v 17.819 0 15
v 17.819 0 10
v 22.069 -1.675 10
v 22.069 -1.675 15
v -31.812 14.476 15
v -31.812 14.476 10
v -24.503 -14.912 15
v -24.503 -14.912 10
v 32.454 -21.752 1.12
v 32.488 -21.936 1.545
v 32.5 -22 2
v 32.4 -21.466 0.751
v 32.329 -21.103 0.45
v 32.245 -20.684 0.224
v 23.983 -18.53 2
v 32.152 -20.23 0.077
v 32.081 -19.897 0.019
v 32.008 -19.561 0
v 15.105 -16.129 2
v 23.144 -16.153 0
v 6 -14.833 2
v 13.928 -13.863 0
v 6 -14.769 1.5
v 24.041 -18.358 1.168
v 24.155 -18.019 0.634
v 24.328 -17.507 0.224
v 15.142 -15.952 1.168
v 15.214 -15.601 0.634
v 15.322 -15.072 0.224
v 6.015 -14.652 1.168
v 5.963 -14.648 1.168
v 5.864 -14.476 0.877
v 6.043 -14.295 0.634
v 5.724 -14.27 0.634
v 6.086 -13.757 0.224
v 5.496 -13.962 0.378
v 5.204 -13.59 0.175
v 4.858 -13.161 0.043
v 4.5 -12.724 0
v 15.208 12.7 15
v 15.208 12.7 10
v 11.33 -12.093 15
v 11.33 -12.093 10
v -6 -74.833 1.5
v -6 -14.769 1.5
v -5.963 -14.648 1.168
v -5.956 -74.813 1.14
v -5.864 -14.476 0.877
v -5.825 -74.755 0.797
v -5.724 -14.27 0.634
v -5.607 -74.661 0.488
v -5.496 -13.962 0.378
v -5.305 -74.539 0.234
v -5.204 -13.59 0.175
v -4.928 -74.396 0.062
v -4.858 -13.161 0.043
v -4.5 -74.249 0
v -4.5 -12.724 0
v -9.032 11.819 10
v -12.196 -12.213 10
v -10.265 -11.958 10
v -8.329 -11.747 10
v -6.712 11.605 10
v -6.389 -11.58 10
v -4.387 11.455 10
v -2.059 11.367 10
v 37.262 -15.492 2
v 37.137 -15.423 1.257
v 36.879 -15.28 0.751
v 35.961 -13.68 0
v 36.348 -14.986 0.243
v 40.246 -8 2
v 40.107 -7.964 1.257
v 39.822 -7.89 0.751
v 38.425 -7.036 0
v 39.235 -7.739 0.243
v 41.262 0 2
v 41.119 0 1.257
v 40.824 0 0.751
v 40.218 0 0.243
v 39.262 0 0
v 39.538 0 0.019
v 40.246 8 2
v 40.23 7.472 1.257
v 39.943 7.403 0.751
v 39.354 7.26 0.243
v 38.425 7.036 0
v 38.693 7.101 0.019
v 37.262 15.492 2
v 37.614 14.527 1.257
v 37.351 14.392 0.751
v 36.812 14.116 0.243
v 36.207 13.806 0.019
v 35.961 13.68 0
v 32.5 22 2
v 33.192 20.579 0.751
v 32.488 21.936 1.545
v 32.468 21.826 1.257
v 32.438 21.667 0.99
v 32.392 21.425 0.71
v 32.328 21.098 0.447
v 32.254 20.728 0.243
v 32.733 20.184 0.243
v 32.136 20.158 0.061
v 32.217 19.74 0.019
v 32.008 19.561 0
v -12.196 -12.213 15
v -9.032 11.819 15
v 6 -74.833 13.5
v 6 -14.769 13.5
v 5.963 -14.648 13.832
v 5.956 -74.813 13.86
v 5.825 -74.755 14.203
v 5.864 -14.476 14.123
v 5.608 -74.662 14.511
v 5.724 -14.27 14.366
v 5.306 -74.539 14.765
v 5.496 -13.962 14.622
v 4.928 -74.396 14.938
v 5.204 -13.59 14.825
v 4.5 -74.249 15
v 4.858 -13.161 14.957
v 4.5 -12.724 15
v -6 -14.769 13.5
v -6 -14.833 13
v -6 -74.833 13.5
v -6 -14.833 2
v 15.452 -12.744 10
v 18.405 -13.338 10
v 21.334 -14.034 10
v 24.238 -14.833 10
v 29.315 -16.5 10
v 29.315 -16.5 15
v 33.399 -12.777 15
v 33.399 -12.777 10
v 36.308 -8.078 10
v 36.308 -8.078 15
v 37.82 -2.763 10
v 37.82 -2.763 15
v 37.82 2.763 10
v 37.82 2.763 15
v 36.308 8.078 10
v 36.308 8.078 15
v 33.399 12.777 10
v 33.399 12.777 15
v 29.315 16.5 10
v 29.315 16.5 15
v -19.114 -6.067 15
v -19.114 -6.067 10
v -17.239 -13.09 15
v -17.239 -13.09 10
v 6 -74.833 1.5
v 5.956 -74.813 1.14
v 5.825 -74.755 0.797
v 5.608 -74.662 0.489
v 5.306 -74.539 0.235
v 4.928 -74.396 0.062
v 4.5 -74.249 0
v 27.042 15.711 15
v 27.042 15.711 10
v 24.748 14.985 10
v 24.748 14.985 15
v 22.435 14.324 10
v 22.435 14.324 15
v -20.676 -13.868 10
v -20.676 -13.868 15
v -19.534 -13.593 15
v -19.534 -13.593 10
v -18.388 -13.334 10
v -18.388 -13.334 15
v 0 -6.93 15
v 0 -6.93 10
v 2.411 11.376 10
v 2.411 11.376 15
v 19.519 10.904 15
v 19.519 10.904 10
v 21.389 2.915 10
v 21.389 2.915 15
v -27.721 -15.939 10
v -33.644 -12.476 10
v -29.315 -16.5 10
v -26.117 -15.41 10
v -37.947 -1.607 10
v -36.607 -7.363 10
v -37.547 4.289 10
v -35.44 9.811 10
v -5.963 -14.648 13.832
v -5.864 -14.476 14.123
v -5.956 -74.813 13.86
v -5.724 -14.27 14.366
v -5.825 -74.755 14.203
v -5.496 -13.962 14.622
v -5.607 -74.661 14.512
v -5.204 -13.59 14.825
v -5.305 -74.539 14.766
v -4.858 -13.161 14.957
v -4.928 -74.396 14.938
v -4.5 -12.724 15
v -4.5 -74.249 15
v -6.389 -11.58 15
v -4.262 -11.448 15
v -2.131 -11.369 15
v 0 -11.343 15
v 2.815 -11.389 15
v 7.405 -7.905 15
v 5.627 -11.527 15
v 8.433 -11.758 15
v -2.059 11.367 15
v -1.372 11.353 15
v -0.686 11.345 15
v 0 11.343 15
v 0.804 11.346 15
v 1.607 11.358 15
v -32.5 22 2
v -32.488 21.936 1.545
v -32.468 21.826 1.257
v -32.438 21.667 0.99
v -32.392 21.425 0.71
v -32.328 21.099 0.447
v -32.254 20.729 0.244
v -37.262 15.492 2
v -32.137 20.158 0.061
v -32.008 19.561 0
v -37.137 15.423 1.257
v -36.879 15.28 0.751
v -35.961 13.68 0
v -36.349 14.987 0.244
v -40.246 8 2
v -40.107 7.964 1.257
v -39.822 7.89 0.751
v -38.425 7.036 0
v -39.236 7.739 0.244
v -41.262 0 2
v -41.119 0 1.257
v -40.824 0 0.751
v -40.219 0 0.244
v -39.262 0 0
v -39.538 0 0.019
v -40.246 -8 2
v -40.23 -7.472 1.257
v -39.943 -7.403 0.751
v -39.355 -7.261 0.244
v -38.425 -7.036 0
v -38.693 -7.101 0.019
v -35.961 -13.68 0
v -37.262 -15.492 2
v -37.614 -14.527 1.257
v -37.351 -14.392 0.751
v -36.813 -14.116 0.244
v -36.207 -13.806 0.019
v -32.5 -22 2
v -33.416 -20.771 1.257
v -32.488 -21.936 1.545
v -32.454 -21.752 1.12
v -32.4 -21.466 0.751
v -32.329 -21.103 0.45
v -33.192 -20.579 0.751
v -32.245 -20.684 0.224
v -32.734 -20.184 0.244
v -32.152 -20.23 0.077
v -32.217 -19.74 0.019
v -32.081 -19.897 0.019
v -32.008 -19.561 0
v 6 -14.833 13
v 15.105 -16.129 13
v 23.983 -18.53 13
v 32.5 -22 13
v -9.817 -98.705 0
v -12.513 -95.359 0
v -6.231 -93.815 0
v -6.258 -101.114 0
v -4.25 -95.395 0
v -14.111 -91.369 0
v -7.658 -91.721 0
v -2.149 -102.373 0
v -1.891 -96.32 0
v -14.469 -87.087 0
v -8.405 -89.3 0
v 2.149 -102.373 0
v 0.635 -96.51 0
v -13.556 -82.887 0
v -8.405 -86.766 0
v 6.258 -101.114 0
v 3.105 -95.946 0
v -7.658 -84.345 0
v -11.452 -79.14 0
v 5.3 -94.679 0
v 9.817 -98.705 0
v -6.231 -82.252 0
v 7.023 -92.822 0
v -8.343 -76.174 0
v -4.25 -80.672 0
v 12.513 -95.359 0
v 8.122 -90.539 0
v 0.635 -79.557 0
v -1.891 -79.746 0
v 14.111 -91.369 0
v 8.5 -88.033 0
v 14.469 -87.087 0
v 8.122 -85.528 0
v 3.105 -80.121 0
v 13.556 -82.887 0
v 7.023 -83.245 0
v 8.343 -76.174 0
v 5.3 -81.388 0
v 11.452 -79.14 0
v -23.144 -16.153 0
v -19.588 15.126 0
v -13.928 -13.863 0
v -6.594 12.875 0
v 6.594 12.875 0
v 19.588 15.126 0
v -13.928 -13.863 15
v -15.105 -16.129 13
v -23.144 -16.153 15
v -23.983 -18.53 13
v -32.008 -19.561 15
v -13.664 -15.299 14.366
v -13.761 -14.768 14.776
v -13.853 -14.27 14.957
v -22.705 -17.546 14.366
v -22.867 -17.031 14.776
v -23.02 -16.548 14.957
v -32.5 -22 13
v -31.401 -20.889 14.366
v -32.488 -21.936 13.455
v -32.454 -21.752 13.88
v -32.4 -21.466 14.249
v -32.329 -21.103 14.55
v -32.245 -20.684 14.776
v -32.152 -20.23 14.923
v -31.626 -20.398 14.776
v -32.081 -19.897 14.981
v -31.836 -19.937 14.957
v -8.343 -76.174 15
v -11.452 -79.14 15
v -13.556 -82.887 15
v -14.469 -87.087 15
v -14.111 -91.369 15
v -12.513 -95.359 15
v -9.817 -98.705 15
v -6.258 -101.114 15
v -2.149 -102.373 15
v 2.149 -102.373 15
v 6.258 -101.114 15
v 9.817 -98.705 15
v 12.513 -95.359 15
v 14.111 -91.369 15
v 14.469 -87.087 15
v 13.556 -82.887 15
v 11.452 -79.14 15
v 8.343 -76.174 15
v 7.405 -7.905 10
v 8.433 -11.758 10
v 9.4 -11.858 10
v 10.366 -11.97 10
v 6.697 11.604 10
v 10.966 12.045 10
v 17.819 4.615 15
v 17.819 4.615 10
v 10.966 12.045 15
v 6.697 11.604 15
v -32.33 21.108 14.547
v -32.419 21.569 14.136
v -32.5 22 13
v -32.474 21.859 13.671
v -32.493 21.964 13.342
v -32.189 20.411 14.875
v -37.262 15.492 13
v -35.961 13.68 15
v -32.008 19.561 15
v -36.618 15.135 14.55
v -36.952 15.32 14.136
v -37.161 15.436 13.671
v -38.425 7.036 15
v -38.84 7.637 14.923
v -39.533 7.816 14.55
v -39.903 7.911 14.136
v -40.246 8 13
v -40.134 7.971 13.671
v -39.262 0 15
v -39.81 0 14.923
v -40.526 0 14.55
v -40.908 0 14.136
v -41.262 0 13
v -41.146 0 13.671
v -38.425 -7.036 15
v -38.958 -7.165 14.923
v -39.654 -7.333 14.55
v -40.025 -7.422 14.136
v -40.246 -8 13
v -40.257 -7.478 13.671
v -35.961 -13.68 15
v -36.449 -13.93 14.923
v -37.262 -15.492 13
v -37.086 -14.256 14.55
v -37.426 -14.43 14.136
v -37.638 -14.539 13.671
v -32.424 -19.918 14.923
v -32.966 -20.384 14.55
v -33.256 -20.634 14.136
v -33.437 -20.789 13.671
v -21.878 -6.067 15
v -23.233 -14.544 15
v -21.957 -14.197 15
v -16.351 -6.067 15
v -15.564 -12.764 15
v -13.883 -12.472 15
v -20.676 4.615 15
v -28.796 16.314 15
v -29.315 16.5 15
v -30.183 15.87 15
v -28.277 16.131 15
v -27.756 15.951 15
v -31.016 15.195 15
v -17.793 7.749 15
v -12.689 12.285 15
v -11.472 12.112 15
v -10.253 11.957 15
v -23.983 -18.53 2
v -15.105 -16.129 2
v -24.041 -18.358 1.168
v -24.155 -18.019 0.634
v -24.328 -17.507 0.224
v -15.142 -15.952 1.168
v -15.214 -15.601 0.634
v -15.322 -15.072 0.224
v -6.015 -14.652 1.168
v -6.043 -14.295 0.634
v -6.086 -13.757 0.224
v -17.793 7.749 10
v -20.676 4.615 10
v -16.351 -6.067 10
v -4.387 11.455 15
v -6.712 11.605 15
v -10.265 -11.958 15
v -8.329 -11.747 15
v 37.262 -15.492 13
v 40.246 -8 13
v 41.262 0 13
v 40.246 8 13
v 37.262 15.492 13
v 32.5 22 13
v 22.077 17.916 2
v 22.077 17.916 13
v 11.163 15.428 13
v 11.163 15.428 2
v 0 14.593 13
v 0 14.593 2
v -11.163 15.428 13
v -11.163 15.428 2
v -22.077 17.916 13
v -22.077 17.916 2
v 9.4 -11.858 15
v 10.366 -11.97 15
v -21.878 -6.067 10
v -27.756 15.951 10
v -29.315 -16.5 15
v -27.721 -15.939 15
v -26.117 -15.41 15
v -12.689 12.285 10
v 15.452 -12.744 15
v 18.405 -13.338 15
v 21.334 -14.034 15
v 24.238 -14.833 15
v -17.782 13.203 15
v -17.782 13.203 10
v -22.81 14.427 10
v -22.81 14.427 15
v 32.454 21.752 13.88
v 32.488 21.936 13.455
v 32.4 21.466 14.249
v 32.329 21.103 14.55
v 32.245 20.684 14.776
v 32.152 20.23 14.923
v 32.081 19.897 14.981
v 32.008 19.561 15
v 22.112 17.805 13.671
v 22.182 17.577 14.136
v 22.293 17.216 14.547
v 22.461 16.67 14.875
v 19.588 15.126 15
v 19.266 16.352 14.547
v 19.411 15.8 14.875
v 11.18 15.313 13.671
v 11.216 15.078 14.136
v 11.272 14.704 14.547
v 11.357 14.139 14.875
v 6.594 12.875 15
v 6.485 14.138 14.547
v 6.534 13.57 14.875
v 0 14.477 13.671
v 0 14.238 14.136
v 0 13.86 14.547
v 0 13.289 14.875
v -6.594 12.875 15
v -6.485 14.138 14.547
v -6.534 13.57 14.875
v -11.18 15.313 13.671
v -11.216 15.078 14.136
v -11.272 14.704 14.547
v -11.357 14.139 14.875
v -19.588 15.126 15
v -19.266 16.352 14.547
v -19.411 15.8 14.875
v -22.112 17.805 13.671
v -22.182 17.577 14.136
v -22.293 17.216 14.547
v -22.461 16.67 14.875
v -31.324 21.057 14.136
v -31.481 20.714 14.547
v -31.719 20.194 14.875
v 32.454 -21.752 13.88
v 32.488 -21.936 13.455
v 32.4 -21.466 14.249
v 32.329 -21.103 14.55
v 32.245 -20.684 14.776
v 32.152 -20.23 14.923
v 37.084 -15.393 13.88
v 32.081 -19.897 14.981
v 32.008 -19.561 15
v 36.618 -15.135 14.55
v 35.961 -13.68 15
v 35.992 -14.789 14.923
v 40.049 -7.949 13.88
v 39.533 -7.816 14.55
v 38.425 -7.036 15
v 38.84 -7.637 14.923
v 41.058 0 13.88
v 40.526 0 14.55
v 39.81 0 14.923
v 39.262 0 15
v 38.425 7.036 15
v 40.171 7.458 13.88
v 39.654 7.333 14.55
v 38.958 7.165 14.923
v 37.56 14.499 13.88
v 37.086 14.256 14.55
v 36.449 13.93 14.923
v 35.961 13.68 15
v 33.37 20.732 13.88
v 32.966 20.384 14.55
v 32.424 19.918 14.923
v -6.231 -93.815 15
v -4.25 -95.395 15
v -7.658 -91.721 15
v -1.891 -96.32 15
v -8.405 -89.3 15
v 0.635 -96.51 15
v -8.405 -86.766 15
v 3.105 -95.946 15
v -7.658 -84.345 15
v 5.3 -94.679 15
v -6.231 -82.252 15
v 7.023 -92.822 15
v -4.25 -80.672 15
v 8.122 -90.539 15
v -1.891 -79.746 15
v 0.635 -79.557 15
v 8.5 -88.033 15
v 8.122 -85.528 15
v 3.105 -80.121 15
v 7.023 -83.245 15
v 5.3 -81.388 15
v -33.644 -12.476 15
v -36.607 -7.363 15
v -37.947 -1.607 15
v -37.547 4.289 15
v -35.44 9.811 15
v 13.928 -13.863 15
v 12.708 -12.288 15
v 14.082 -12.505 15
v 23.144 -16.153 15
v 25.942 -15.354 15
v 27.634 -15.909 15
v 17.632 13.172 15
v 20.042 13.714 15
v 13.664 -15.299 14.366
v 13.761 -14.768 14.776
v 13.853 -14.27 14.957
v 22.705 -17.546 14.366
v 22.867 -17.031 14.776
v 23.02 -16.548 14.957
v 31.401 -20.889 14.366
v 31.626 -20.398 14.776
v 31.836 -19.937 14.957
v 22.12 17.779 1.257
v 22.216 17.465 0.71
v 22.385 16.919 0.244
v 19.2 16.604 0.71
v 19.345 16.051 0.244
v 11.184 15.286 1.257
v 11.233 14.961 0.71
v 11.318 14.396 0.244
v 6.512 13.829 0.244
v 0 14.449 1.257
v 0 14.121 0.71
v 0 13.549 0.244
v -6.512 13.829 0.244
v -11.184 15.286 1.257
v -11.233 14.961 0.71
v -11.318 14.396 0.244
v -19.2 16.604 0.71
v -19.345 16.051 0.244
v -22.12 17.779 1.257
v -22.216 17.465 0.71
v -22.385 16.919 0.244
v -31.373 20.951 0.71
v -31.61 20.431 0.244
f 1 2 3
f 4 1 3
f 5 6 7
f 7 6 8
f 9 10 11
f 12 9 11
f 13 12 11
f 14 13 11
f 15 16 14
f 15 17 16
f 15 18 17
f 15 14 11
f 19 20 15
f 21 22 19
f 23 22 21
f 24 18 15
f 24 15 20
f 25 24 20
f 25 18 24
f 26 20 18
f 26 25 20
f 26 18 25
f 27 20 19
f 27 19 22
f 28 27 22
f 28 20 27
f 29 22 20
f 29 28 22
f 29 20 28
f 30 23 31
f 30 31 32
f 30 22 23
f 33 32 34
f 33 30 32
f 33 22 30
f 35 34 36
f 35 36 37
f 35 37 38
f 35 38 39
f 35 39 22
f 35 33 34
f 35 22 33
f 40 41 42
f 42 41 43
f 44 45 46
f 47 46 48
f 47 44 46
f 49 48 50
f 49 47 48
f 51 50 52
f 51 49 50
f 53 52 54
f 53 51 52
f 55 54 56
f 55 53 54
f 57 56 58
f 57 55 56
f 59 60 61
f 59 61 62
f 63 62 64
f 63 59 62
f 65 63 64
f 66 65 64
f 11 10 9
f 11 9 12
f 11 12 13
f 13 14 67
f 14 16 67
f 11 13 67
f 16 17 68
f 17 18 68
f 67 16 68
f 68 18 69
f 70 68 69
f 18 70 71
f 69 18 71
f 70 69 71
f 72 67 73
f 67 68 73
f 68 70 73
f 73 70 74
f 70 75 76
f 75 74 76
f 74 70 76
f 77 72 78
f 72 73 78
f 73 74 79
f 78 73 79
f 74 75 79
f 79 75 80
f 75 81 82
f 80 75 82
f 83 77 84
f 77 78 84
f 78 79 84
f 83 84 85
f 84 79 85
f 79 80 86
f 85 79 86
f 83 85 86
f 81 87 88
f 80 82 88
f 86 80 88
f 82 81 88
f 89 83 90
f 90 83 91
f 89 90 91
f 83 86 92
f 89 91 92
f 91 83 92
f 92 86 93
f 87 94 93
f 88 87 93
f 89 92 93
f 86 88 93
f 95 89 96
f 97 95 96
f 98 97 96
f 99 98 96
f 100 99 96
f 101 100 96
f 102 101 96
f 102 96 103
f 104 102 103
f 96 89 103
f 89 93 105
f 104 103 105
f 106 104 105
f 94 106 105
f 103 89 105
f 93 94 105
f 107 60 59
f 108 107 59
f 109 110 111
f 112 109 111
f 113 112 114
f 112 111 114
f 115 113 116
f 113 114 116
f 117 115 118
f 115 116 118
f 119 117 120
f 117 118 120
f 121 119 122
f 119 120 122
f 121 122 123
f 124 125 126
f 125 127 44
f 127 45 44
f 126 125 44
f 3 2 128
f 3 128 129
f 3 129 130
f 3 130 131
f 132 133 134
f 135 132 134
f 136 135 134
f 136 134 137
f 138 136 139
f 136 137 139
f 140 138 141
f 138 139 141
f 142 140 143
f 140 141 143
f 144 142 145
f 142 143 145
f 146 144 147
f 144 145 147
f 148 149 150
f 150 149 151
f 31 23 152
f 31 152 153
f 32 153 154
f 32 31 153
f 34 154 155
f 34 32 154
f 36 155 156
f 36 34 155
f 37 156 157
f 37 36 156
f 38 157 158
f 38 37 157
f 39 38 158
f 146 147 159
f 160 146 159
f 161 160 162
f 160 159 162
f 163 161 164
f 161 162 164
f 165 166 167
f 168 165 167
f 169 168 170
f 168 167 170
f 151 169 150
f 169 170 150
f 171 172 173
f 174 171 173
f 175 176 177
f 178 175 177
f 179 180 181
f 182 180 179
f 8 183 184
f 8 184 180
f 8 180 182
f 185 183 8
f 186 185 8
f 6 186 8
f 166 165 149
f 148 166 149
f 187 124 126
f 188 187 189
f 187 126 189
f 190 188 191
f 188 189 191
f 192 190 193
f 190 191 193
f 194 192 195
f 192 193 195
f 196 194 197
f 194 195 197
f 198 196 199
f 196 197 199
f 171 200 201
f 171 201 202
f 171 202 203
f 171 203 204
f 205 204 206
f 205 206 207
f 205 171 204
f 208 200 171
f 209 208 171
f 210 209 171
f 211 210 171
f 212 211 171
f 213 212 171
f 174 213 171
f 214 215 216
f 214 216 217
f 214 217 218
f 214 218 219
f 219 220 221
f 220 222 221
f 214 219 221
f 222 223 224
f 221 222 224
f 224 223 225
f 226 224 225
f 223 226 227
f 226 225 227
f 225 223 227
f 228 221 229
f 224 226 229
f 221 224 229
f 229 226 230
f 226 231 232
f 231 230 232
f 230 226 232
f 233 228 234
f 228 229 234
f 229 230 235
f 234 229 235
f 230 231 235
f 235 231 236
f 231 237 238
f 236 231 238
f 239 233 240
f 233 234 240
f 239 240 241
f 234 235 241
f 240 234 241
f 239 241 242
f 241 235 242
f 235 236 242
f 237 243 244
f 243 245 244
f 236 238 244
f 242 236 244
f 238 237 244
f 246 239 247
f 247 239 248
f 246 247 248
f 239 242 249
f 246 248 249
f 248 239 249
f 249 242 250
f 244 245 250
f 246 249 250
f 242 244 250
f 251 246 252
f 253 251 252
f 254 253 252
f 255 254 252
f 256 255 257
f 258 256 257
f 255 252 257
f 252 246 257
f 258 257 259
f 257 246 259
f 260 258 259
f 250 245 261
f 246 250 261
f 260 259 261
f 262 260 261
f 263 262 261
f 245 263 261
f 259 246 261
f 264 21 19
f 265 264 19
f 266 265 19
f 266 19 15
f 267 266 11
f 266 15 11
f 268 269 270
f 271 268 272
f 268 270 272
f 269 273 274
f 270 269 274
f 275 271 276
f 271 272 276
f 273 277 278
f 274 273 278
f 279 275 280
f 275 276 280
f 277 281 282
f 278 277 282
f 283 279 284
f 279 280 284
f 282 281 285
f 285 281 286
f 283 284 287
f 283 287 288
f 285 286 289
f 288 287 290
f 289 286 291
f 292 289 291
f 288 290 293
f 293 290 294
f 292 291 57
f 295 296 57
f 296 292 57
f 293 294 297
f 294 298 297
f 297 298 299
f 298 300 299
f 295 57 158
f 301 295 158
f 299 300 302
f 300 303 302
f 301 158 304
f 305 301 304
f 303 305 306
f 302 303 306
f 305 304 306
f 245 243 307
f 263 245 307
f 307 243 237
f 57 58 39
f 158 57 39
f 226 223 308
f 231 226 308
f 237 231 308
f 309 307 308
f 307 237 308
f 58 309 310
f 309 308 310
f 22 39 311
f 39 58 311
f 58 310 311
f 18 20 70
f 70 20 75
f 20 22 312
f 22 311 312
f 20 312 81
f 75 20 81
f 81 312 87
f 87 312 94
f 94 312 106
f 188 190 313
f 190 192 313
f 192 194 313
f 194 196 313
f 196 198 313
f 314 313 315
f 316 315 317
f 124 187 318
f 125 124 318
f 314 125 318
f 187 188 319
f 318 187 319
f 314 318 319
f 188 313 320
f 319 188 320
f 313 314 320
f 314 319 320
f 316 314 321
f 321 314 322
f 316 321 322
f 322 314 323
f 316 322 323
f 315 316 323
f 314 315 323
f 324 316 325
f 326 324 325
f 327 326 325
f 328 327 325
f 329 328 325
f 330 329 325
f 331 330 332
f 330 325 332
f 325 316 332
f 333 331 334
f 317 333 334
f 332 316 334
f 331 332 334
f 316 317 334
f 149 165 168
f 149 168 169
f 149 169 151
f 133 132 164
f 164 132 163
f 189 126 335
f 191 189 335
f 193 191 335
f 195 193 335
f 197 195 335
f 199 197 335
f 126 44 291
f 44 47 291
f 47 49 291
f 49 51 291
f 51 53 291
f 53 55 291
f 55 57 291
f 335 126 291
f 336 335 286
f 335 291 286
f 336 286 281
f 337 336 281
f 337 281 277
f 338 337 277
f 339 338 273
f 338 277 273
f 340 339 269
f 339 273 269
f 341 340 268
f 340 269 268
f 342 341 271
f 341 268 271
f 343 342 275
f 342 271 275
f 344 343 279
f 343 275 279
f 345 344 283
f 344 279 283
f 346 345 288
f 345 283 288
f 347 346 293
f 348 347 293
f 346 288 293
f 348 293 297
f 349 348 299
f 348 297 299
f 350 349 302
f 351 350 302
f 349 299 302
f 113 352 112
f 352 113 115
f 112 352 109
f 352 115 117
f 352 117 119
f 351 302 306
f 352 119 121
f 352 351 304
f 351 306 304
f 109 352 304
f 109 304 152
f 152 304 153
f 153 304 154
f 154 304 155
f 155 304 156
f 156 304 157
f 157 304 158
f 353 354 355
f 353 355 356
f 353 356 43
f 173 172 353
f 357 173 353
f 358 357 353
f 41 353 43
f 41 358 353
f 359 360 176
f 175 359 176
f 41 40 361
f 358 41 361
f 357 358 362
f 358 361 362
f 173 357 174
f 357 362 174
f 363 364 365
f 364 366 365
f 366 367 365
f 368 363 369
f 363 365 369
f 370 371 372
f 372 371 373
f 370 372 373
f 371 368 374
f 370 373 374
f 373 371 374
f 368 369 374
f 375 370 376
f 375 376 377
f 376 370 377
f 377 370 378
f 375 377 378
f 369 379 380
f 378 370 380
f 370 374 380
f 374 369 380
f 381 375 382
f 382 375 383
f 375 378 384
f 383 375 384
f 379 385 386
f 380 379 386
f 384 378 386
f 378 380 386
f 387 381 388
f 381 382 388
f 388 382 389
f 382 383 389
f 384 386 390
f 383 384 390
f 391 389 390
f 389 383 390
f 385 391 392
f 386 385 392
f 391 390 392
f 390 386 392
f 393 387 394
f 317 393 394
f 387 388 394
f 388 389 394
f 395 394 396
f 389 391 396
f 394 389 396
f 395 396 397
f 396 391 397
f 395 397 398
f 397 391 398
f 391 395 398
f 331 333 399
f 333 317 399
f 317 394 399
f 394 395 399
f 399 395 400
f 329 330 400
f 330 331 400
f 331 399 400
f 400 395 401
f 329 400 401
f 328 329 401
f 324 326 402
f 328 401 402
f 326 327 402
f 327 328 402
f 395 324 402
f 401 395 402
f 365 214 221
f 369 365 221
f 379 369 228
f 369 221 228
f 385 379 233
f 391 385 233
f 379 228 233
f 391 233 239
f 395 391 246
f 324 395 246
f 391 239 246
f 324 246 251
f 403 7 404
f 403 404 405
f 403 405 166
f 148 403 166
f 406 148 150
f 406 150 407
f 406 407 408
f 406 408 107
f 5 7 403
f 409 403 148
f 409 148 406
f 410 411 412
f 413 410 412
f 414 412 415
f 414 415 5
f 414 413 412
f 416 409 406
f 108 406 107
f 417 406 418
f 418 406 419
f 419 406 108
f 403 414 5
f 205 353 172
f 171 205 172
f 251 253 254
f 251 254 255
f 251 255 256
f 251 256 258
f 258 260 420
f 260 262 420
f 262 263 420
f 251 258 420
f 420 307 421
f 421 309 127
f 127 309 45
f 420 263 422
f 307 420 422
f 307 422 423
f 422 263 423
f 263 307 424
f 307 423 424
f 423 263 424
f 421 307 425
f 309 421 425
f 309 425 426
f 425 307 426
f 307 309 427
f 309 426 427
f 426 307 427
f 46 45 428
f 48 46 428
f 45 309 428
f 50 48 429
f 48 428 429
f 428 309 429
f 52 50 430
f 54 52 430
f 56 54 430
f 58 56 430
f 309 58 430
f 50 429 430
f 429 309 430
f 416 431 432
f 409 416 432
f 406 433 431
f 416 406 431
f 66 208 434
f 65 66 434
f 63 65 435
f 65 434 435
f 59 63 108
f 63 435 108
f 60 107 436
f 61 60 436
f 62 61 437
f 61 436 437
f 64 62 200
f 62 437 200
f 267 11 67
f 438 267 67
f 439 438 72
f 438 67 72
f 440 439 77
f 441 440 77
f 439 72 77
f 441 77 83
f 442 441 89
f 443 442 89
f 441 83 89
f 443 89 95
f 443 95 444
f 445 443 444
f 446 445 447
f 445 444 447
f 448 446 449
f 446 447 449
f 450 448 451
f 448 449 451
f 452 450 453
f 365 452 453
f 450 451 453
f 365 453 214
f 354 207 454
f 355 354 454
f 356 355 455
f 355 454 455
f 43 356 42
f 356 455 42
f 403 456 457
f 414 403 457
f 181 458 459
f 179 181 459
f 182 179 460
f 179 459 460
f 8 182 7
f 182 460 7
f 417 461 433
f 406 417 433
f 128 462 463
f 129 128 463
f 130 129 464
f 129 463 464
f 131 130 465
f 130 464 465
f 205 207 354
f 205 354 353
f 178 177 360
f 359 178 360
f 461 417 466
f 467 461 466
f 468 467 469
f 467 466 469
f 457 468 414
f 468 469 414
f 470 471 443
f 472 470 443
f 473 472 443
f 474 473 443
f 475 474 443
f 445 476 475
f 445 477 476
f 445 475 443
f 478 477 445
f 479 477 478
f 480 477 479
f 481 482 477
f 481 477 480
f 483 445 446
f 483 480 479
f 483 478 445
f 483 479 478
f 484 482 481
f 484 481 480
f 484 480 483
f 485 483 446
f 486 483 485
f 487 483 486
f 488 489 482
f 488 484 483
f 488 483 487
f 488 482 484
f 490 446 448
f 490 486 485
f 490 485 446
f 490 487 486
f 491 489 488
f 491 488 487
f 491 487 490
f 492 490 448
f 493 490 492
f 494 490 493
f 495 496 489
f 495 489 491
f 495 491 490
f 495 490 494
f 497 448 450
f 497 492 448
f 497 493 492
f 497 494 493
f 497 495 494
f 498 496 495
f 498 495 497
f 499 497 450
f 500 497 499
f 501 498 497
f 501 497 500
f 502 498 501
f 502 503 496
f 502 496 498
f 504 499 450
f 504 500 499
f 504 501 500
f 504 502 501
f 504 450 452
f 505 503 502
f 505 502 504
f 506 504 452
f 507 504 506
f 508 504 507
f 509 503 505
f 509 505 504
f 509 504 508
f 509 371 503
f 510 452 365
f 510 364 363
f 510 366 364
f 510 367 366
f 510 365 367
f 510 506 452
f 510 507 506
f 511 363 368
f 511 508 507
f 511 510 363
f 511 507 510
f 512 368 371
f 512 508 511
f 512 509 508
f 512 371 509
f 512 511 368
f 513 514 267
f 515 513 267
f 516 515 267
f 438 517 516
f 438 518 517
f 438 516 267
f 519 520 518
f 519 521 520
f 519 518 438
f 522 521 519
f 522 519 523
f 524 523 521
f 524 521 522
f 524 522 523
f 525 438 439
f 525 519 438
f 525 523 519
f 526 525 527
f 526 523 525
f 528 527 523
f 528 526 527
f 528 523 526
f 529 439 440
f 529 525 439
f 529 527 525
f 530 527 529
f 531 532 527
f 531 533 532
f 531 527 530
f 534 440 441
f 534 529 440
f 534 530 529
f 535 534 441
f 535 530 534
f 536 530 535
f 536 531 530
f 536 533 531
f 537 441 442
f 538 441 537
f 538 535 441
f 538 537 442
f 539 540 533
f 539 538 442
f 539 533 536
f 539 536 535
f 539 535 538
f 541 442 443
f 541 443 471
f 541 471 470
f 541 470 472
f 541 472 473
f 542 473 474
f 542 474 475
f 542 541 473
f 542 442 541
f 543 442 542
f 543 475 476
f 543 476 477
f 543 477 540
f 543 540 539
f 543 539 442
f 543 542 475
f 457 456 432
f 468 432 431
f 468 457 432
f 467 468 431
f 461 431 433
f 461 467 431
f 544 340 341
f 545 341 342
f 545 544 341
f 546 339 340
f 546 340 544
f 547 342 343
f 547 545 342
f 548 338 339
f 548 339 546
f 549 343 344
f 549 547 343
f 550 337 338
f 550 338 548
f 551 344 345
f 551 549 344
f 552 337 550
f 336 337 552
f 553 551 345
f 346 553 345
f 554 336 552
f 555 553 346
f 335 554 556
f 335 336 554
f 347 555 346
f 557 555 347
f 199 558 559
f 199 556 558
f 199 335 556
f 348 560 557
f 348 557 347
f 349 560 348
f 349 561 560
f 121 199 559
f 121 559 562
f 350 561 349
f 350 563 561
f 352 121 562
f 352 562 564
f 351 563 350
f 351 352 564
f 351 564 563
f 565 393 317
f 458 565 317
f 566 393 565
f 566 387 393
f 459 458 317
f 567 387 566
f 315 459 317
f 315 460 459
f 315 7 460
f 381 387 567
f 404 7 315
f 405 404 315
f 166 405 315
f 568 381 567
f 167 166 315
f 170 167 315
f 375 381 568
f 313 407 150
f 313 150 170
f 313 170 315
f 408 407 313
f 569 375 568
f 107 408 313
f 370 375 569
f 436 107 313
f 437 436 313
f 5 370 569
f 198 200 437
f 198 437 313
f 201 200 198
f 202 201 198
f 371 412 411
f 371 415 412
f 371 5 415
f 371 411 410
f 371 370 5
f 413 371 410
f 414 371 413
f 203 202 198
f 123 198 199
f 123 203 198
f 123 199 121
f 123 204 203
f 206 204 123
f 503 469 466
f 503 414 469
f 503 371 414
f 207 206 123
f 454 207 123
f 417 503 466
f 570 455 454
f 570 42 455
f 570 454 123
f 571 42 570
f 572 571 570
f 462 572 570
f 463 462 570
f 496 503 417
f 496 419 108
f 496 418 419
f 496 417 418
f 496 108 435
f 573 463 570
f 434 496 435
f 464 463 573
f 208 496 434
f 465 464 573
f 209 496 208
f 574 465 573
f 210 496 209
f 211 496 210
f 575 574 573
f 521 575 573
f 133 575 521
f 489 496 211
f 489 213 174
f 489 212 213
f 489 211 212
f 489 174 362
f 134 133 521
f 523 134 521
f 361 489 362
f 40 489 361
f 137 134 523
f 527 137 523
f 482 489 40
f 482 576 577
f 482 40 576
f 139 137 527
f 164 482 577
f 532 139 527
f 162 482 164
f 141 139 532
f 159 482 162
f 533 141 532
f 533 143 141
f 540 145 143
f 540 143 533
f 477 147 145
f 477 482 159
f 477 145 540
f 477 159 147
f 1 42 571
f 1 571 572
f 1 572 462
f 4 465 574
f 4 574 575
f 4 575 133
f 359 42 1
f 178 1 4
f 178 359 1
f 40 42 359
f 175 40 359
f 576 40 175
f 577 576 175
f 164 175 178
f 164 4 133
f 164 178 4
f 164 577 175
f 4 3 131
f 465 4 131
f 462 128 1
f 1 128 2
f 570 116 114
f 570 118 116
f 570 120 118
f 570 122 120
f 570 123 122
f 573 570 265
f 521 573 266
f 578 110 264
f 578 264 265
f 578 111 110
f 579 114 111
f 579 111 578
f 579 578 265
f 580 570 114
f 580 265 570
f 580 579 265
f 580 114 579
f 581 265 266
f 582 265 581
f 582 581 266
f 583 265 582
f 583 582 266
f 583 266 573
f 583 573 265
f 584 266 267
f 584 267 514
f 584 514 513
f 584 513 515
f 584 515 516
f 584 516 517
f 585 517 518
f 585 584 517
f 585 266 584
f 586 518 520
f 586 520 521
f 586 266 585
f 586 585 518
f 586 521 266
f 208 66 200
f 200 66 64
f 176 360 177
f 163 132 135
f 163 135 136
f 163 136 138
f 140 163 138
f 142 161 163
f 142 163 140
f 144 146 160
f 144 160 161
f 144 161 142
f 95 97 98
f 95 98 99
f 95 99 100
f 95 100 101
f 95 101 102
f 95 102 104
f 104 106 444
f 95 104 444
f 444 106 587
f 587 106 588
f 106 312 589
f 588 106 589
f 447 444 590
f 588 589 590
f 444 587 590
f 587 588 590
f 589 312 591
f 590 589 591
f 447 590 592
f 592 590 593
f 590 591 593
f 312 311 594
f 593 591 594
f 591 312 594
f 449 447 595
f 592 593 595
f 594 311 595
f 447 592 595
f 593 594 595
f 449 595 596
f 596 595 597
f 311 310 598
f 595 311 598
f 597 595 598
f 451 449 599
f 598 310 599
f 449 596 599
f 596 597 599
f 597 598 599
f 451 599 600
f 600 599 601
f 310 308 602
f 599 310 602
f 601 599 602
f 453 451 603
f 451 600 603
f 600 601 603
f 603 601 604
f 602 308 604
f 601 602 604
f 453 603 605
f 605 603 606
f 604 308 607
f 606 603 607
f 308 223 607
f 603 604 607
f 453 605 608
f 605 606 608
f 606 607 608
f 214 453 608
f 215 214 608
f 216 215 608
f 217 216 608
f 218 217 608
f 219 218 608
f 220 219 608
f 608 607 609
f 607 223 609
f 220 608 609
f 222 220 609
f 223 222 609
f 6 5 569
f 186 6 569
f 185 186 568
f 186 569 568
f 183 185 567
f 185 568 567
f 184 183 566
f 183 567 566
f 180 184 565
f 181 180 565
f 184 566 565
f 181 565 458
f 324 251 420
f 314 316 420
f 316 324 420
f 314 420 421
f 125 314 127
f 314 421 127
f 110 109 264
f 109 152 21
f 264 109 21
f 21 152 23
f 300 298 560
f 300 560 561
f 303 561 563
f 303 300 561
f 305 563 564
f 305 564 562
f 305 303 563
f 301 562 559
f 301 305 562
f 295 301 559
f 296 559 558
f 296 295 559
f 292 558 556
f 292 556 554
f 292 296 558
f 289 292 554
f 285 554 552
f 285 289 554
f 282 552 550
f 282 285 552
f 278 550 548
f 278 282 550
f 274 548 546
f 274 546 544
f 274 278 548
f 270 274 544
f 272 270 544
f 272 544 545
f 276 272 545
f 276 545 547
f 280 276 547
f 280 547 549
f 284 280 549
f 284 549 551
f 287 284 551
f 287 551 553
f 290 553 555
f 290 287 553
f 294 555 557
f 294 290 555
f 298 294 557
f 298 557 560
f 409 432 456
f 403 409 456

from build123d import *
from build123d import SkipClean  # not in build123d's __all__

# Parameters (mm, degrees)
F0_R     = 8.5
F1_DEPTH = 15
F2_R     = 1.5
F4_R     = 2
F5_DEPTH = 5
F7_DEPTH = 5


with BuildPart() as f1:
    # F0 (on Top) → F1 (new body)
    with BuildSketch(Plane.XY):
        with BuildLine():
            Line((-32.5, -22), (-32.5, 22))
            ThreePointArc((-32.5, 22), (-41.2620999228, 0), (-32.5, -22))
        make_face()
        with BuildLine():
            ThreePointArc((32.5, 22), (0, 14.592529173), (-32.5, 22))
            Line((-32.5, 22), (0, 0))
            Line((0, 0), (32.5, 22))
        make_face()
        Polygon((0, 0), (-32.5, 22), (-32.5, -22), align=None)
        with BuildLine():
            Line((0, 0), (-32.5, -22))
            ThreePointArc((-32.5, -22), (-19.5807119119, -17.1936637052), (-6, -14.8329144067))
            ThreePointArc((-6, -14.8329144067), (0, -14.592529173), (6, -14.8329144067))
            ThreePointArc((6, -14.8329144067), (19.5807119119, -17.1936637052), (32.5, -22))
            Line((32.5, -22), (0, 0))
        make_face()
        Polygon((32.5, -22), (32.5, 22), (0, 0), align=None)
        with BuildLine():
            ThreePointArc((32.5, -22), (41.2620999228, 0), (32.5, 22))
            Line((32.5, 22), (32.5, -22))
        make_face()
        with BuildLine():
            ThreePointArc((6, -14.8329144067), (0, -14.592529173), (-6, -14.8329144067))
            Line((-6, -14.8329144067), (-6, -74.8329144067))
            Line((-6, -74.8329144067), (6, -74.8329144067))
            Line((6, -74.8329144067), (6, -14.8329144067))
        make_face()
        with BuildLine():
            Line((6, -74.8329144067), (-6, -74.8329144067))
            ThreePointArc((-6, -74.8329144067), (0, -102.5332931892), (6, -74.8329144067))
        make_face()
        with Locations((0, -88.0332931892)):
            Circle(F0_R, mode=Mode.SUBTRACT)
    extrude(amount=F1_DEPTH)

    # F2
    f2_edges = [f1.edges().sort_by_distance(p)[0] for p in [
        (-6, -44.832914, 15),
        (6, -44.832914, 15),
        (6, -44.832914, 0),
        (-6, -44.832914, 0),
    ]]
    fillet(f2_edges, radius=F2_R)

    # F4
    f4_edges = [f1.edges().sort_by_distance(p)[0] for p in [
        (-19.580712, -17.193664, 15),
        (-41.2621, 0, 15),
        (19.580712, -17.193664, 15),
        (-19.580712, -17.193664, 0),
        (-41.2621, 0, 0),
        (0, 14.592529, 0),
        (41.2621, 0, 0),
        (19.580712, -17.193664, 0),
        (41.2621, 0, 15),
        (0, 14.592529, 15),
    ]]
    fillet(f4_edges, radius=F4_R)

    # F3 (on face) → F5 (cut)
    with BuildSketch(Plane.XY.offset(15)):
        with BuildLine():
            Line((-29.3147544782, -16.5), (-29.3147544782, 16.5))
            ThreePointArc((-29.3147544782, 16.5), (-38.0120999228, 0), (-29.3147544782, -16.5))
        make_face()
        with BuildLine():
            ThreePointArc((0, 11.342529173), (-14.8824925286, 12.6417227993), (-29.3147544782, 16.5))
            Line((-29.3147544782, 16.5), (0, 0))
            Line((0, 0), (0, 11.342529173))
        make_face()
        Polygon((0, 0), (-29.3147544782, 16.5), (-29.3147544782, -16.5), align=None)
        with BuildLine():
            Line((0, 0), (-29.3147544782, -16.5))
            ThreePointArc((-29.3147544782, -16.5), (-14.8824925285, -12.6417227993), (0, -11.342529173))
            Line((0, -11.342529173), (0, 0))
        make_face()
        with BuildLine():
            ThreePointArc((29.3147544782, 16.5), (14.8824925286, 12.6417227993), (0, 11.342529173))
            Line((0, 11.342529173), (0, 0))
            Line((0, 0), (29.3147544782, 16.5))
        make_face()
        Polygon((29.3147544782, 16.5), (0, 0), (29.3147544782, -16.5), align=None)
        with BuildLine():
            Line((29.3147544782, -16.5), (0, 0))
            Line((0, 0), (0, -11.342529173))
            ThreePointArc((0, -11.342529173), (14.8824925286, -12.6417227993), (29.3147544782, -16.5))
        make_face()
        with BuildLine():
            ThreePointArc((29.3147544782, -16.5), (38.0120999228, 0), (29.3147544782, 16.5))
            Line((29.3147544782, 16.5), (29.3147544782, -16.5))
        make_face()
    with SkipClean():  # cleaning this boolean's faces spoils the solid; the shape is the same uncleaned
        extrude(amount=-F5_DEPTH, mode=Mode.SUBTRACT)

    # F6 (on face) → F7 (join)
    with BuildSketch(Plane.XY.offset(10)):
        with BuildLine():
            Line((15.2079802839, 12.699633284), (11.3304843403, -12.0931563405))
            ThreePointArc((11.3304843403, -12.0931563405), (13.3952654965, -12.3935064492), (15.4521416161, -12.7439233999))
            Line((15.4521416161, -12.7439233999), (17.8190562874, 0))
            Line((17.8190562874, 0), (22.0686495304, -1.6748139169))
            Line((22.0686495304, -1.6748139169), (24.2379181726, -14.8333900519))
            ThreePointArc((24.2379181726, -14.8333900519), (26.7892998078, -15.6272055953), (29.3147544782, -16.5))
            Line((29.3147544782, -16.5), (22.4350078947, 14.3243580948))
            ThreePointArc((22.4350078947, 14.3243580948), (18.8390172894, 13.4340497811), (15.2079802839, 12.699633284))
        make_face()
        Polygon((17.8190562874, 4.6145855449), (19.5188932121, 10.9039852396), (21.3887151331, 2.9147479217), align=None, mode=Mode.SUBTRACT)
        with BuildLine():
            Line((-2.0585943572, 11.3672025947), (-6.3891717286, -11.5804961029))
            ThreePointArc((-6.3891717286, -11.5804961029), (1.0259296068, -11.3486565705), (8.4333769686, -11.7575587165))
            Line((8.4333769686, -11.7575587165), (7.4048662885, -7.905074934))
            Line((7.4048662885, -7.905074934), (0, -6.9299801253))
            Line((0, -6.9299801253), (2.4106339203, 11.3763647448))
            ThreePointArc((2.4106339203, 11.3763647448), (0.1760793848, 11.3427096587), (-2.0585943572, 11.3672025947))
        make_face()
        with BuildLine():
            ThreePointArc((-29.3147544782, 16.5), (-30.604070915, 15.5384126129), (-31.8119491831, 14.4763310404))
            Line((-31.8119491831, 14.4763310404), (-24.5027556892, -14.9117551872))
            ThreePointArc((-24.5027556892, -14.9117551872), (-22.5955271512, -14.3679613691), (-20.6762515008, -13.8683481283))
            Line((-20.6762515008, -13.8683481283), (-19.114445895, -6.066611968))
            Line((-19.114445895, -6.066611968), (-17.2392854565, -13.0903846112))
            ThreePointArc((-17.2392854565, -13.0903846112), (-14.7242186042, -12.614029589), (-12.1960735351, -12.2128340149))
            Line((-12.1960735351, -12.2128340149), (-9.0315309989, 11.8186900319))
            ThreePointArc((-9.0315309989, 11.8186900319), (-10.8625432372, 12.0321900371), (-12.6885517924, 12.2849366013))
            Line((-12.6885517924, 12.2849366013), (-16.3512527943, -6.066611968))
            Line((-16.3512527943, -6.066611968), (-17.7929196507, 7.7493544668))
            Line((-17.7929196507, 7.7493544668), (-20.6762515008, 4.6145855449))
            Line((-20.6762515008, 4.6145855449), (-21.8776389956, -6.066611968))
            Line((-21.8776389956, -6.066611968), (-27.7557073698, 15.9508191787))
            ThreePointArc((-27.7557073698, 15.9508191787), (-28.5365520654, 16.2216590548), (-29.3147544782, 16.5))
        make_face()
    with SkipClean():  # cleaning this boolean's faces spoils the solid; the shape is the same uncleaned
        extrude(amount=F7_DEPTH)


solid = f1.part
